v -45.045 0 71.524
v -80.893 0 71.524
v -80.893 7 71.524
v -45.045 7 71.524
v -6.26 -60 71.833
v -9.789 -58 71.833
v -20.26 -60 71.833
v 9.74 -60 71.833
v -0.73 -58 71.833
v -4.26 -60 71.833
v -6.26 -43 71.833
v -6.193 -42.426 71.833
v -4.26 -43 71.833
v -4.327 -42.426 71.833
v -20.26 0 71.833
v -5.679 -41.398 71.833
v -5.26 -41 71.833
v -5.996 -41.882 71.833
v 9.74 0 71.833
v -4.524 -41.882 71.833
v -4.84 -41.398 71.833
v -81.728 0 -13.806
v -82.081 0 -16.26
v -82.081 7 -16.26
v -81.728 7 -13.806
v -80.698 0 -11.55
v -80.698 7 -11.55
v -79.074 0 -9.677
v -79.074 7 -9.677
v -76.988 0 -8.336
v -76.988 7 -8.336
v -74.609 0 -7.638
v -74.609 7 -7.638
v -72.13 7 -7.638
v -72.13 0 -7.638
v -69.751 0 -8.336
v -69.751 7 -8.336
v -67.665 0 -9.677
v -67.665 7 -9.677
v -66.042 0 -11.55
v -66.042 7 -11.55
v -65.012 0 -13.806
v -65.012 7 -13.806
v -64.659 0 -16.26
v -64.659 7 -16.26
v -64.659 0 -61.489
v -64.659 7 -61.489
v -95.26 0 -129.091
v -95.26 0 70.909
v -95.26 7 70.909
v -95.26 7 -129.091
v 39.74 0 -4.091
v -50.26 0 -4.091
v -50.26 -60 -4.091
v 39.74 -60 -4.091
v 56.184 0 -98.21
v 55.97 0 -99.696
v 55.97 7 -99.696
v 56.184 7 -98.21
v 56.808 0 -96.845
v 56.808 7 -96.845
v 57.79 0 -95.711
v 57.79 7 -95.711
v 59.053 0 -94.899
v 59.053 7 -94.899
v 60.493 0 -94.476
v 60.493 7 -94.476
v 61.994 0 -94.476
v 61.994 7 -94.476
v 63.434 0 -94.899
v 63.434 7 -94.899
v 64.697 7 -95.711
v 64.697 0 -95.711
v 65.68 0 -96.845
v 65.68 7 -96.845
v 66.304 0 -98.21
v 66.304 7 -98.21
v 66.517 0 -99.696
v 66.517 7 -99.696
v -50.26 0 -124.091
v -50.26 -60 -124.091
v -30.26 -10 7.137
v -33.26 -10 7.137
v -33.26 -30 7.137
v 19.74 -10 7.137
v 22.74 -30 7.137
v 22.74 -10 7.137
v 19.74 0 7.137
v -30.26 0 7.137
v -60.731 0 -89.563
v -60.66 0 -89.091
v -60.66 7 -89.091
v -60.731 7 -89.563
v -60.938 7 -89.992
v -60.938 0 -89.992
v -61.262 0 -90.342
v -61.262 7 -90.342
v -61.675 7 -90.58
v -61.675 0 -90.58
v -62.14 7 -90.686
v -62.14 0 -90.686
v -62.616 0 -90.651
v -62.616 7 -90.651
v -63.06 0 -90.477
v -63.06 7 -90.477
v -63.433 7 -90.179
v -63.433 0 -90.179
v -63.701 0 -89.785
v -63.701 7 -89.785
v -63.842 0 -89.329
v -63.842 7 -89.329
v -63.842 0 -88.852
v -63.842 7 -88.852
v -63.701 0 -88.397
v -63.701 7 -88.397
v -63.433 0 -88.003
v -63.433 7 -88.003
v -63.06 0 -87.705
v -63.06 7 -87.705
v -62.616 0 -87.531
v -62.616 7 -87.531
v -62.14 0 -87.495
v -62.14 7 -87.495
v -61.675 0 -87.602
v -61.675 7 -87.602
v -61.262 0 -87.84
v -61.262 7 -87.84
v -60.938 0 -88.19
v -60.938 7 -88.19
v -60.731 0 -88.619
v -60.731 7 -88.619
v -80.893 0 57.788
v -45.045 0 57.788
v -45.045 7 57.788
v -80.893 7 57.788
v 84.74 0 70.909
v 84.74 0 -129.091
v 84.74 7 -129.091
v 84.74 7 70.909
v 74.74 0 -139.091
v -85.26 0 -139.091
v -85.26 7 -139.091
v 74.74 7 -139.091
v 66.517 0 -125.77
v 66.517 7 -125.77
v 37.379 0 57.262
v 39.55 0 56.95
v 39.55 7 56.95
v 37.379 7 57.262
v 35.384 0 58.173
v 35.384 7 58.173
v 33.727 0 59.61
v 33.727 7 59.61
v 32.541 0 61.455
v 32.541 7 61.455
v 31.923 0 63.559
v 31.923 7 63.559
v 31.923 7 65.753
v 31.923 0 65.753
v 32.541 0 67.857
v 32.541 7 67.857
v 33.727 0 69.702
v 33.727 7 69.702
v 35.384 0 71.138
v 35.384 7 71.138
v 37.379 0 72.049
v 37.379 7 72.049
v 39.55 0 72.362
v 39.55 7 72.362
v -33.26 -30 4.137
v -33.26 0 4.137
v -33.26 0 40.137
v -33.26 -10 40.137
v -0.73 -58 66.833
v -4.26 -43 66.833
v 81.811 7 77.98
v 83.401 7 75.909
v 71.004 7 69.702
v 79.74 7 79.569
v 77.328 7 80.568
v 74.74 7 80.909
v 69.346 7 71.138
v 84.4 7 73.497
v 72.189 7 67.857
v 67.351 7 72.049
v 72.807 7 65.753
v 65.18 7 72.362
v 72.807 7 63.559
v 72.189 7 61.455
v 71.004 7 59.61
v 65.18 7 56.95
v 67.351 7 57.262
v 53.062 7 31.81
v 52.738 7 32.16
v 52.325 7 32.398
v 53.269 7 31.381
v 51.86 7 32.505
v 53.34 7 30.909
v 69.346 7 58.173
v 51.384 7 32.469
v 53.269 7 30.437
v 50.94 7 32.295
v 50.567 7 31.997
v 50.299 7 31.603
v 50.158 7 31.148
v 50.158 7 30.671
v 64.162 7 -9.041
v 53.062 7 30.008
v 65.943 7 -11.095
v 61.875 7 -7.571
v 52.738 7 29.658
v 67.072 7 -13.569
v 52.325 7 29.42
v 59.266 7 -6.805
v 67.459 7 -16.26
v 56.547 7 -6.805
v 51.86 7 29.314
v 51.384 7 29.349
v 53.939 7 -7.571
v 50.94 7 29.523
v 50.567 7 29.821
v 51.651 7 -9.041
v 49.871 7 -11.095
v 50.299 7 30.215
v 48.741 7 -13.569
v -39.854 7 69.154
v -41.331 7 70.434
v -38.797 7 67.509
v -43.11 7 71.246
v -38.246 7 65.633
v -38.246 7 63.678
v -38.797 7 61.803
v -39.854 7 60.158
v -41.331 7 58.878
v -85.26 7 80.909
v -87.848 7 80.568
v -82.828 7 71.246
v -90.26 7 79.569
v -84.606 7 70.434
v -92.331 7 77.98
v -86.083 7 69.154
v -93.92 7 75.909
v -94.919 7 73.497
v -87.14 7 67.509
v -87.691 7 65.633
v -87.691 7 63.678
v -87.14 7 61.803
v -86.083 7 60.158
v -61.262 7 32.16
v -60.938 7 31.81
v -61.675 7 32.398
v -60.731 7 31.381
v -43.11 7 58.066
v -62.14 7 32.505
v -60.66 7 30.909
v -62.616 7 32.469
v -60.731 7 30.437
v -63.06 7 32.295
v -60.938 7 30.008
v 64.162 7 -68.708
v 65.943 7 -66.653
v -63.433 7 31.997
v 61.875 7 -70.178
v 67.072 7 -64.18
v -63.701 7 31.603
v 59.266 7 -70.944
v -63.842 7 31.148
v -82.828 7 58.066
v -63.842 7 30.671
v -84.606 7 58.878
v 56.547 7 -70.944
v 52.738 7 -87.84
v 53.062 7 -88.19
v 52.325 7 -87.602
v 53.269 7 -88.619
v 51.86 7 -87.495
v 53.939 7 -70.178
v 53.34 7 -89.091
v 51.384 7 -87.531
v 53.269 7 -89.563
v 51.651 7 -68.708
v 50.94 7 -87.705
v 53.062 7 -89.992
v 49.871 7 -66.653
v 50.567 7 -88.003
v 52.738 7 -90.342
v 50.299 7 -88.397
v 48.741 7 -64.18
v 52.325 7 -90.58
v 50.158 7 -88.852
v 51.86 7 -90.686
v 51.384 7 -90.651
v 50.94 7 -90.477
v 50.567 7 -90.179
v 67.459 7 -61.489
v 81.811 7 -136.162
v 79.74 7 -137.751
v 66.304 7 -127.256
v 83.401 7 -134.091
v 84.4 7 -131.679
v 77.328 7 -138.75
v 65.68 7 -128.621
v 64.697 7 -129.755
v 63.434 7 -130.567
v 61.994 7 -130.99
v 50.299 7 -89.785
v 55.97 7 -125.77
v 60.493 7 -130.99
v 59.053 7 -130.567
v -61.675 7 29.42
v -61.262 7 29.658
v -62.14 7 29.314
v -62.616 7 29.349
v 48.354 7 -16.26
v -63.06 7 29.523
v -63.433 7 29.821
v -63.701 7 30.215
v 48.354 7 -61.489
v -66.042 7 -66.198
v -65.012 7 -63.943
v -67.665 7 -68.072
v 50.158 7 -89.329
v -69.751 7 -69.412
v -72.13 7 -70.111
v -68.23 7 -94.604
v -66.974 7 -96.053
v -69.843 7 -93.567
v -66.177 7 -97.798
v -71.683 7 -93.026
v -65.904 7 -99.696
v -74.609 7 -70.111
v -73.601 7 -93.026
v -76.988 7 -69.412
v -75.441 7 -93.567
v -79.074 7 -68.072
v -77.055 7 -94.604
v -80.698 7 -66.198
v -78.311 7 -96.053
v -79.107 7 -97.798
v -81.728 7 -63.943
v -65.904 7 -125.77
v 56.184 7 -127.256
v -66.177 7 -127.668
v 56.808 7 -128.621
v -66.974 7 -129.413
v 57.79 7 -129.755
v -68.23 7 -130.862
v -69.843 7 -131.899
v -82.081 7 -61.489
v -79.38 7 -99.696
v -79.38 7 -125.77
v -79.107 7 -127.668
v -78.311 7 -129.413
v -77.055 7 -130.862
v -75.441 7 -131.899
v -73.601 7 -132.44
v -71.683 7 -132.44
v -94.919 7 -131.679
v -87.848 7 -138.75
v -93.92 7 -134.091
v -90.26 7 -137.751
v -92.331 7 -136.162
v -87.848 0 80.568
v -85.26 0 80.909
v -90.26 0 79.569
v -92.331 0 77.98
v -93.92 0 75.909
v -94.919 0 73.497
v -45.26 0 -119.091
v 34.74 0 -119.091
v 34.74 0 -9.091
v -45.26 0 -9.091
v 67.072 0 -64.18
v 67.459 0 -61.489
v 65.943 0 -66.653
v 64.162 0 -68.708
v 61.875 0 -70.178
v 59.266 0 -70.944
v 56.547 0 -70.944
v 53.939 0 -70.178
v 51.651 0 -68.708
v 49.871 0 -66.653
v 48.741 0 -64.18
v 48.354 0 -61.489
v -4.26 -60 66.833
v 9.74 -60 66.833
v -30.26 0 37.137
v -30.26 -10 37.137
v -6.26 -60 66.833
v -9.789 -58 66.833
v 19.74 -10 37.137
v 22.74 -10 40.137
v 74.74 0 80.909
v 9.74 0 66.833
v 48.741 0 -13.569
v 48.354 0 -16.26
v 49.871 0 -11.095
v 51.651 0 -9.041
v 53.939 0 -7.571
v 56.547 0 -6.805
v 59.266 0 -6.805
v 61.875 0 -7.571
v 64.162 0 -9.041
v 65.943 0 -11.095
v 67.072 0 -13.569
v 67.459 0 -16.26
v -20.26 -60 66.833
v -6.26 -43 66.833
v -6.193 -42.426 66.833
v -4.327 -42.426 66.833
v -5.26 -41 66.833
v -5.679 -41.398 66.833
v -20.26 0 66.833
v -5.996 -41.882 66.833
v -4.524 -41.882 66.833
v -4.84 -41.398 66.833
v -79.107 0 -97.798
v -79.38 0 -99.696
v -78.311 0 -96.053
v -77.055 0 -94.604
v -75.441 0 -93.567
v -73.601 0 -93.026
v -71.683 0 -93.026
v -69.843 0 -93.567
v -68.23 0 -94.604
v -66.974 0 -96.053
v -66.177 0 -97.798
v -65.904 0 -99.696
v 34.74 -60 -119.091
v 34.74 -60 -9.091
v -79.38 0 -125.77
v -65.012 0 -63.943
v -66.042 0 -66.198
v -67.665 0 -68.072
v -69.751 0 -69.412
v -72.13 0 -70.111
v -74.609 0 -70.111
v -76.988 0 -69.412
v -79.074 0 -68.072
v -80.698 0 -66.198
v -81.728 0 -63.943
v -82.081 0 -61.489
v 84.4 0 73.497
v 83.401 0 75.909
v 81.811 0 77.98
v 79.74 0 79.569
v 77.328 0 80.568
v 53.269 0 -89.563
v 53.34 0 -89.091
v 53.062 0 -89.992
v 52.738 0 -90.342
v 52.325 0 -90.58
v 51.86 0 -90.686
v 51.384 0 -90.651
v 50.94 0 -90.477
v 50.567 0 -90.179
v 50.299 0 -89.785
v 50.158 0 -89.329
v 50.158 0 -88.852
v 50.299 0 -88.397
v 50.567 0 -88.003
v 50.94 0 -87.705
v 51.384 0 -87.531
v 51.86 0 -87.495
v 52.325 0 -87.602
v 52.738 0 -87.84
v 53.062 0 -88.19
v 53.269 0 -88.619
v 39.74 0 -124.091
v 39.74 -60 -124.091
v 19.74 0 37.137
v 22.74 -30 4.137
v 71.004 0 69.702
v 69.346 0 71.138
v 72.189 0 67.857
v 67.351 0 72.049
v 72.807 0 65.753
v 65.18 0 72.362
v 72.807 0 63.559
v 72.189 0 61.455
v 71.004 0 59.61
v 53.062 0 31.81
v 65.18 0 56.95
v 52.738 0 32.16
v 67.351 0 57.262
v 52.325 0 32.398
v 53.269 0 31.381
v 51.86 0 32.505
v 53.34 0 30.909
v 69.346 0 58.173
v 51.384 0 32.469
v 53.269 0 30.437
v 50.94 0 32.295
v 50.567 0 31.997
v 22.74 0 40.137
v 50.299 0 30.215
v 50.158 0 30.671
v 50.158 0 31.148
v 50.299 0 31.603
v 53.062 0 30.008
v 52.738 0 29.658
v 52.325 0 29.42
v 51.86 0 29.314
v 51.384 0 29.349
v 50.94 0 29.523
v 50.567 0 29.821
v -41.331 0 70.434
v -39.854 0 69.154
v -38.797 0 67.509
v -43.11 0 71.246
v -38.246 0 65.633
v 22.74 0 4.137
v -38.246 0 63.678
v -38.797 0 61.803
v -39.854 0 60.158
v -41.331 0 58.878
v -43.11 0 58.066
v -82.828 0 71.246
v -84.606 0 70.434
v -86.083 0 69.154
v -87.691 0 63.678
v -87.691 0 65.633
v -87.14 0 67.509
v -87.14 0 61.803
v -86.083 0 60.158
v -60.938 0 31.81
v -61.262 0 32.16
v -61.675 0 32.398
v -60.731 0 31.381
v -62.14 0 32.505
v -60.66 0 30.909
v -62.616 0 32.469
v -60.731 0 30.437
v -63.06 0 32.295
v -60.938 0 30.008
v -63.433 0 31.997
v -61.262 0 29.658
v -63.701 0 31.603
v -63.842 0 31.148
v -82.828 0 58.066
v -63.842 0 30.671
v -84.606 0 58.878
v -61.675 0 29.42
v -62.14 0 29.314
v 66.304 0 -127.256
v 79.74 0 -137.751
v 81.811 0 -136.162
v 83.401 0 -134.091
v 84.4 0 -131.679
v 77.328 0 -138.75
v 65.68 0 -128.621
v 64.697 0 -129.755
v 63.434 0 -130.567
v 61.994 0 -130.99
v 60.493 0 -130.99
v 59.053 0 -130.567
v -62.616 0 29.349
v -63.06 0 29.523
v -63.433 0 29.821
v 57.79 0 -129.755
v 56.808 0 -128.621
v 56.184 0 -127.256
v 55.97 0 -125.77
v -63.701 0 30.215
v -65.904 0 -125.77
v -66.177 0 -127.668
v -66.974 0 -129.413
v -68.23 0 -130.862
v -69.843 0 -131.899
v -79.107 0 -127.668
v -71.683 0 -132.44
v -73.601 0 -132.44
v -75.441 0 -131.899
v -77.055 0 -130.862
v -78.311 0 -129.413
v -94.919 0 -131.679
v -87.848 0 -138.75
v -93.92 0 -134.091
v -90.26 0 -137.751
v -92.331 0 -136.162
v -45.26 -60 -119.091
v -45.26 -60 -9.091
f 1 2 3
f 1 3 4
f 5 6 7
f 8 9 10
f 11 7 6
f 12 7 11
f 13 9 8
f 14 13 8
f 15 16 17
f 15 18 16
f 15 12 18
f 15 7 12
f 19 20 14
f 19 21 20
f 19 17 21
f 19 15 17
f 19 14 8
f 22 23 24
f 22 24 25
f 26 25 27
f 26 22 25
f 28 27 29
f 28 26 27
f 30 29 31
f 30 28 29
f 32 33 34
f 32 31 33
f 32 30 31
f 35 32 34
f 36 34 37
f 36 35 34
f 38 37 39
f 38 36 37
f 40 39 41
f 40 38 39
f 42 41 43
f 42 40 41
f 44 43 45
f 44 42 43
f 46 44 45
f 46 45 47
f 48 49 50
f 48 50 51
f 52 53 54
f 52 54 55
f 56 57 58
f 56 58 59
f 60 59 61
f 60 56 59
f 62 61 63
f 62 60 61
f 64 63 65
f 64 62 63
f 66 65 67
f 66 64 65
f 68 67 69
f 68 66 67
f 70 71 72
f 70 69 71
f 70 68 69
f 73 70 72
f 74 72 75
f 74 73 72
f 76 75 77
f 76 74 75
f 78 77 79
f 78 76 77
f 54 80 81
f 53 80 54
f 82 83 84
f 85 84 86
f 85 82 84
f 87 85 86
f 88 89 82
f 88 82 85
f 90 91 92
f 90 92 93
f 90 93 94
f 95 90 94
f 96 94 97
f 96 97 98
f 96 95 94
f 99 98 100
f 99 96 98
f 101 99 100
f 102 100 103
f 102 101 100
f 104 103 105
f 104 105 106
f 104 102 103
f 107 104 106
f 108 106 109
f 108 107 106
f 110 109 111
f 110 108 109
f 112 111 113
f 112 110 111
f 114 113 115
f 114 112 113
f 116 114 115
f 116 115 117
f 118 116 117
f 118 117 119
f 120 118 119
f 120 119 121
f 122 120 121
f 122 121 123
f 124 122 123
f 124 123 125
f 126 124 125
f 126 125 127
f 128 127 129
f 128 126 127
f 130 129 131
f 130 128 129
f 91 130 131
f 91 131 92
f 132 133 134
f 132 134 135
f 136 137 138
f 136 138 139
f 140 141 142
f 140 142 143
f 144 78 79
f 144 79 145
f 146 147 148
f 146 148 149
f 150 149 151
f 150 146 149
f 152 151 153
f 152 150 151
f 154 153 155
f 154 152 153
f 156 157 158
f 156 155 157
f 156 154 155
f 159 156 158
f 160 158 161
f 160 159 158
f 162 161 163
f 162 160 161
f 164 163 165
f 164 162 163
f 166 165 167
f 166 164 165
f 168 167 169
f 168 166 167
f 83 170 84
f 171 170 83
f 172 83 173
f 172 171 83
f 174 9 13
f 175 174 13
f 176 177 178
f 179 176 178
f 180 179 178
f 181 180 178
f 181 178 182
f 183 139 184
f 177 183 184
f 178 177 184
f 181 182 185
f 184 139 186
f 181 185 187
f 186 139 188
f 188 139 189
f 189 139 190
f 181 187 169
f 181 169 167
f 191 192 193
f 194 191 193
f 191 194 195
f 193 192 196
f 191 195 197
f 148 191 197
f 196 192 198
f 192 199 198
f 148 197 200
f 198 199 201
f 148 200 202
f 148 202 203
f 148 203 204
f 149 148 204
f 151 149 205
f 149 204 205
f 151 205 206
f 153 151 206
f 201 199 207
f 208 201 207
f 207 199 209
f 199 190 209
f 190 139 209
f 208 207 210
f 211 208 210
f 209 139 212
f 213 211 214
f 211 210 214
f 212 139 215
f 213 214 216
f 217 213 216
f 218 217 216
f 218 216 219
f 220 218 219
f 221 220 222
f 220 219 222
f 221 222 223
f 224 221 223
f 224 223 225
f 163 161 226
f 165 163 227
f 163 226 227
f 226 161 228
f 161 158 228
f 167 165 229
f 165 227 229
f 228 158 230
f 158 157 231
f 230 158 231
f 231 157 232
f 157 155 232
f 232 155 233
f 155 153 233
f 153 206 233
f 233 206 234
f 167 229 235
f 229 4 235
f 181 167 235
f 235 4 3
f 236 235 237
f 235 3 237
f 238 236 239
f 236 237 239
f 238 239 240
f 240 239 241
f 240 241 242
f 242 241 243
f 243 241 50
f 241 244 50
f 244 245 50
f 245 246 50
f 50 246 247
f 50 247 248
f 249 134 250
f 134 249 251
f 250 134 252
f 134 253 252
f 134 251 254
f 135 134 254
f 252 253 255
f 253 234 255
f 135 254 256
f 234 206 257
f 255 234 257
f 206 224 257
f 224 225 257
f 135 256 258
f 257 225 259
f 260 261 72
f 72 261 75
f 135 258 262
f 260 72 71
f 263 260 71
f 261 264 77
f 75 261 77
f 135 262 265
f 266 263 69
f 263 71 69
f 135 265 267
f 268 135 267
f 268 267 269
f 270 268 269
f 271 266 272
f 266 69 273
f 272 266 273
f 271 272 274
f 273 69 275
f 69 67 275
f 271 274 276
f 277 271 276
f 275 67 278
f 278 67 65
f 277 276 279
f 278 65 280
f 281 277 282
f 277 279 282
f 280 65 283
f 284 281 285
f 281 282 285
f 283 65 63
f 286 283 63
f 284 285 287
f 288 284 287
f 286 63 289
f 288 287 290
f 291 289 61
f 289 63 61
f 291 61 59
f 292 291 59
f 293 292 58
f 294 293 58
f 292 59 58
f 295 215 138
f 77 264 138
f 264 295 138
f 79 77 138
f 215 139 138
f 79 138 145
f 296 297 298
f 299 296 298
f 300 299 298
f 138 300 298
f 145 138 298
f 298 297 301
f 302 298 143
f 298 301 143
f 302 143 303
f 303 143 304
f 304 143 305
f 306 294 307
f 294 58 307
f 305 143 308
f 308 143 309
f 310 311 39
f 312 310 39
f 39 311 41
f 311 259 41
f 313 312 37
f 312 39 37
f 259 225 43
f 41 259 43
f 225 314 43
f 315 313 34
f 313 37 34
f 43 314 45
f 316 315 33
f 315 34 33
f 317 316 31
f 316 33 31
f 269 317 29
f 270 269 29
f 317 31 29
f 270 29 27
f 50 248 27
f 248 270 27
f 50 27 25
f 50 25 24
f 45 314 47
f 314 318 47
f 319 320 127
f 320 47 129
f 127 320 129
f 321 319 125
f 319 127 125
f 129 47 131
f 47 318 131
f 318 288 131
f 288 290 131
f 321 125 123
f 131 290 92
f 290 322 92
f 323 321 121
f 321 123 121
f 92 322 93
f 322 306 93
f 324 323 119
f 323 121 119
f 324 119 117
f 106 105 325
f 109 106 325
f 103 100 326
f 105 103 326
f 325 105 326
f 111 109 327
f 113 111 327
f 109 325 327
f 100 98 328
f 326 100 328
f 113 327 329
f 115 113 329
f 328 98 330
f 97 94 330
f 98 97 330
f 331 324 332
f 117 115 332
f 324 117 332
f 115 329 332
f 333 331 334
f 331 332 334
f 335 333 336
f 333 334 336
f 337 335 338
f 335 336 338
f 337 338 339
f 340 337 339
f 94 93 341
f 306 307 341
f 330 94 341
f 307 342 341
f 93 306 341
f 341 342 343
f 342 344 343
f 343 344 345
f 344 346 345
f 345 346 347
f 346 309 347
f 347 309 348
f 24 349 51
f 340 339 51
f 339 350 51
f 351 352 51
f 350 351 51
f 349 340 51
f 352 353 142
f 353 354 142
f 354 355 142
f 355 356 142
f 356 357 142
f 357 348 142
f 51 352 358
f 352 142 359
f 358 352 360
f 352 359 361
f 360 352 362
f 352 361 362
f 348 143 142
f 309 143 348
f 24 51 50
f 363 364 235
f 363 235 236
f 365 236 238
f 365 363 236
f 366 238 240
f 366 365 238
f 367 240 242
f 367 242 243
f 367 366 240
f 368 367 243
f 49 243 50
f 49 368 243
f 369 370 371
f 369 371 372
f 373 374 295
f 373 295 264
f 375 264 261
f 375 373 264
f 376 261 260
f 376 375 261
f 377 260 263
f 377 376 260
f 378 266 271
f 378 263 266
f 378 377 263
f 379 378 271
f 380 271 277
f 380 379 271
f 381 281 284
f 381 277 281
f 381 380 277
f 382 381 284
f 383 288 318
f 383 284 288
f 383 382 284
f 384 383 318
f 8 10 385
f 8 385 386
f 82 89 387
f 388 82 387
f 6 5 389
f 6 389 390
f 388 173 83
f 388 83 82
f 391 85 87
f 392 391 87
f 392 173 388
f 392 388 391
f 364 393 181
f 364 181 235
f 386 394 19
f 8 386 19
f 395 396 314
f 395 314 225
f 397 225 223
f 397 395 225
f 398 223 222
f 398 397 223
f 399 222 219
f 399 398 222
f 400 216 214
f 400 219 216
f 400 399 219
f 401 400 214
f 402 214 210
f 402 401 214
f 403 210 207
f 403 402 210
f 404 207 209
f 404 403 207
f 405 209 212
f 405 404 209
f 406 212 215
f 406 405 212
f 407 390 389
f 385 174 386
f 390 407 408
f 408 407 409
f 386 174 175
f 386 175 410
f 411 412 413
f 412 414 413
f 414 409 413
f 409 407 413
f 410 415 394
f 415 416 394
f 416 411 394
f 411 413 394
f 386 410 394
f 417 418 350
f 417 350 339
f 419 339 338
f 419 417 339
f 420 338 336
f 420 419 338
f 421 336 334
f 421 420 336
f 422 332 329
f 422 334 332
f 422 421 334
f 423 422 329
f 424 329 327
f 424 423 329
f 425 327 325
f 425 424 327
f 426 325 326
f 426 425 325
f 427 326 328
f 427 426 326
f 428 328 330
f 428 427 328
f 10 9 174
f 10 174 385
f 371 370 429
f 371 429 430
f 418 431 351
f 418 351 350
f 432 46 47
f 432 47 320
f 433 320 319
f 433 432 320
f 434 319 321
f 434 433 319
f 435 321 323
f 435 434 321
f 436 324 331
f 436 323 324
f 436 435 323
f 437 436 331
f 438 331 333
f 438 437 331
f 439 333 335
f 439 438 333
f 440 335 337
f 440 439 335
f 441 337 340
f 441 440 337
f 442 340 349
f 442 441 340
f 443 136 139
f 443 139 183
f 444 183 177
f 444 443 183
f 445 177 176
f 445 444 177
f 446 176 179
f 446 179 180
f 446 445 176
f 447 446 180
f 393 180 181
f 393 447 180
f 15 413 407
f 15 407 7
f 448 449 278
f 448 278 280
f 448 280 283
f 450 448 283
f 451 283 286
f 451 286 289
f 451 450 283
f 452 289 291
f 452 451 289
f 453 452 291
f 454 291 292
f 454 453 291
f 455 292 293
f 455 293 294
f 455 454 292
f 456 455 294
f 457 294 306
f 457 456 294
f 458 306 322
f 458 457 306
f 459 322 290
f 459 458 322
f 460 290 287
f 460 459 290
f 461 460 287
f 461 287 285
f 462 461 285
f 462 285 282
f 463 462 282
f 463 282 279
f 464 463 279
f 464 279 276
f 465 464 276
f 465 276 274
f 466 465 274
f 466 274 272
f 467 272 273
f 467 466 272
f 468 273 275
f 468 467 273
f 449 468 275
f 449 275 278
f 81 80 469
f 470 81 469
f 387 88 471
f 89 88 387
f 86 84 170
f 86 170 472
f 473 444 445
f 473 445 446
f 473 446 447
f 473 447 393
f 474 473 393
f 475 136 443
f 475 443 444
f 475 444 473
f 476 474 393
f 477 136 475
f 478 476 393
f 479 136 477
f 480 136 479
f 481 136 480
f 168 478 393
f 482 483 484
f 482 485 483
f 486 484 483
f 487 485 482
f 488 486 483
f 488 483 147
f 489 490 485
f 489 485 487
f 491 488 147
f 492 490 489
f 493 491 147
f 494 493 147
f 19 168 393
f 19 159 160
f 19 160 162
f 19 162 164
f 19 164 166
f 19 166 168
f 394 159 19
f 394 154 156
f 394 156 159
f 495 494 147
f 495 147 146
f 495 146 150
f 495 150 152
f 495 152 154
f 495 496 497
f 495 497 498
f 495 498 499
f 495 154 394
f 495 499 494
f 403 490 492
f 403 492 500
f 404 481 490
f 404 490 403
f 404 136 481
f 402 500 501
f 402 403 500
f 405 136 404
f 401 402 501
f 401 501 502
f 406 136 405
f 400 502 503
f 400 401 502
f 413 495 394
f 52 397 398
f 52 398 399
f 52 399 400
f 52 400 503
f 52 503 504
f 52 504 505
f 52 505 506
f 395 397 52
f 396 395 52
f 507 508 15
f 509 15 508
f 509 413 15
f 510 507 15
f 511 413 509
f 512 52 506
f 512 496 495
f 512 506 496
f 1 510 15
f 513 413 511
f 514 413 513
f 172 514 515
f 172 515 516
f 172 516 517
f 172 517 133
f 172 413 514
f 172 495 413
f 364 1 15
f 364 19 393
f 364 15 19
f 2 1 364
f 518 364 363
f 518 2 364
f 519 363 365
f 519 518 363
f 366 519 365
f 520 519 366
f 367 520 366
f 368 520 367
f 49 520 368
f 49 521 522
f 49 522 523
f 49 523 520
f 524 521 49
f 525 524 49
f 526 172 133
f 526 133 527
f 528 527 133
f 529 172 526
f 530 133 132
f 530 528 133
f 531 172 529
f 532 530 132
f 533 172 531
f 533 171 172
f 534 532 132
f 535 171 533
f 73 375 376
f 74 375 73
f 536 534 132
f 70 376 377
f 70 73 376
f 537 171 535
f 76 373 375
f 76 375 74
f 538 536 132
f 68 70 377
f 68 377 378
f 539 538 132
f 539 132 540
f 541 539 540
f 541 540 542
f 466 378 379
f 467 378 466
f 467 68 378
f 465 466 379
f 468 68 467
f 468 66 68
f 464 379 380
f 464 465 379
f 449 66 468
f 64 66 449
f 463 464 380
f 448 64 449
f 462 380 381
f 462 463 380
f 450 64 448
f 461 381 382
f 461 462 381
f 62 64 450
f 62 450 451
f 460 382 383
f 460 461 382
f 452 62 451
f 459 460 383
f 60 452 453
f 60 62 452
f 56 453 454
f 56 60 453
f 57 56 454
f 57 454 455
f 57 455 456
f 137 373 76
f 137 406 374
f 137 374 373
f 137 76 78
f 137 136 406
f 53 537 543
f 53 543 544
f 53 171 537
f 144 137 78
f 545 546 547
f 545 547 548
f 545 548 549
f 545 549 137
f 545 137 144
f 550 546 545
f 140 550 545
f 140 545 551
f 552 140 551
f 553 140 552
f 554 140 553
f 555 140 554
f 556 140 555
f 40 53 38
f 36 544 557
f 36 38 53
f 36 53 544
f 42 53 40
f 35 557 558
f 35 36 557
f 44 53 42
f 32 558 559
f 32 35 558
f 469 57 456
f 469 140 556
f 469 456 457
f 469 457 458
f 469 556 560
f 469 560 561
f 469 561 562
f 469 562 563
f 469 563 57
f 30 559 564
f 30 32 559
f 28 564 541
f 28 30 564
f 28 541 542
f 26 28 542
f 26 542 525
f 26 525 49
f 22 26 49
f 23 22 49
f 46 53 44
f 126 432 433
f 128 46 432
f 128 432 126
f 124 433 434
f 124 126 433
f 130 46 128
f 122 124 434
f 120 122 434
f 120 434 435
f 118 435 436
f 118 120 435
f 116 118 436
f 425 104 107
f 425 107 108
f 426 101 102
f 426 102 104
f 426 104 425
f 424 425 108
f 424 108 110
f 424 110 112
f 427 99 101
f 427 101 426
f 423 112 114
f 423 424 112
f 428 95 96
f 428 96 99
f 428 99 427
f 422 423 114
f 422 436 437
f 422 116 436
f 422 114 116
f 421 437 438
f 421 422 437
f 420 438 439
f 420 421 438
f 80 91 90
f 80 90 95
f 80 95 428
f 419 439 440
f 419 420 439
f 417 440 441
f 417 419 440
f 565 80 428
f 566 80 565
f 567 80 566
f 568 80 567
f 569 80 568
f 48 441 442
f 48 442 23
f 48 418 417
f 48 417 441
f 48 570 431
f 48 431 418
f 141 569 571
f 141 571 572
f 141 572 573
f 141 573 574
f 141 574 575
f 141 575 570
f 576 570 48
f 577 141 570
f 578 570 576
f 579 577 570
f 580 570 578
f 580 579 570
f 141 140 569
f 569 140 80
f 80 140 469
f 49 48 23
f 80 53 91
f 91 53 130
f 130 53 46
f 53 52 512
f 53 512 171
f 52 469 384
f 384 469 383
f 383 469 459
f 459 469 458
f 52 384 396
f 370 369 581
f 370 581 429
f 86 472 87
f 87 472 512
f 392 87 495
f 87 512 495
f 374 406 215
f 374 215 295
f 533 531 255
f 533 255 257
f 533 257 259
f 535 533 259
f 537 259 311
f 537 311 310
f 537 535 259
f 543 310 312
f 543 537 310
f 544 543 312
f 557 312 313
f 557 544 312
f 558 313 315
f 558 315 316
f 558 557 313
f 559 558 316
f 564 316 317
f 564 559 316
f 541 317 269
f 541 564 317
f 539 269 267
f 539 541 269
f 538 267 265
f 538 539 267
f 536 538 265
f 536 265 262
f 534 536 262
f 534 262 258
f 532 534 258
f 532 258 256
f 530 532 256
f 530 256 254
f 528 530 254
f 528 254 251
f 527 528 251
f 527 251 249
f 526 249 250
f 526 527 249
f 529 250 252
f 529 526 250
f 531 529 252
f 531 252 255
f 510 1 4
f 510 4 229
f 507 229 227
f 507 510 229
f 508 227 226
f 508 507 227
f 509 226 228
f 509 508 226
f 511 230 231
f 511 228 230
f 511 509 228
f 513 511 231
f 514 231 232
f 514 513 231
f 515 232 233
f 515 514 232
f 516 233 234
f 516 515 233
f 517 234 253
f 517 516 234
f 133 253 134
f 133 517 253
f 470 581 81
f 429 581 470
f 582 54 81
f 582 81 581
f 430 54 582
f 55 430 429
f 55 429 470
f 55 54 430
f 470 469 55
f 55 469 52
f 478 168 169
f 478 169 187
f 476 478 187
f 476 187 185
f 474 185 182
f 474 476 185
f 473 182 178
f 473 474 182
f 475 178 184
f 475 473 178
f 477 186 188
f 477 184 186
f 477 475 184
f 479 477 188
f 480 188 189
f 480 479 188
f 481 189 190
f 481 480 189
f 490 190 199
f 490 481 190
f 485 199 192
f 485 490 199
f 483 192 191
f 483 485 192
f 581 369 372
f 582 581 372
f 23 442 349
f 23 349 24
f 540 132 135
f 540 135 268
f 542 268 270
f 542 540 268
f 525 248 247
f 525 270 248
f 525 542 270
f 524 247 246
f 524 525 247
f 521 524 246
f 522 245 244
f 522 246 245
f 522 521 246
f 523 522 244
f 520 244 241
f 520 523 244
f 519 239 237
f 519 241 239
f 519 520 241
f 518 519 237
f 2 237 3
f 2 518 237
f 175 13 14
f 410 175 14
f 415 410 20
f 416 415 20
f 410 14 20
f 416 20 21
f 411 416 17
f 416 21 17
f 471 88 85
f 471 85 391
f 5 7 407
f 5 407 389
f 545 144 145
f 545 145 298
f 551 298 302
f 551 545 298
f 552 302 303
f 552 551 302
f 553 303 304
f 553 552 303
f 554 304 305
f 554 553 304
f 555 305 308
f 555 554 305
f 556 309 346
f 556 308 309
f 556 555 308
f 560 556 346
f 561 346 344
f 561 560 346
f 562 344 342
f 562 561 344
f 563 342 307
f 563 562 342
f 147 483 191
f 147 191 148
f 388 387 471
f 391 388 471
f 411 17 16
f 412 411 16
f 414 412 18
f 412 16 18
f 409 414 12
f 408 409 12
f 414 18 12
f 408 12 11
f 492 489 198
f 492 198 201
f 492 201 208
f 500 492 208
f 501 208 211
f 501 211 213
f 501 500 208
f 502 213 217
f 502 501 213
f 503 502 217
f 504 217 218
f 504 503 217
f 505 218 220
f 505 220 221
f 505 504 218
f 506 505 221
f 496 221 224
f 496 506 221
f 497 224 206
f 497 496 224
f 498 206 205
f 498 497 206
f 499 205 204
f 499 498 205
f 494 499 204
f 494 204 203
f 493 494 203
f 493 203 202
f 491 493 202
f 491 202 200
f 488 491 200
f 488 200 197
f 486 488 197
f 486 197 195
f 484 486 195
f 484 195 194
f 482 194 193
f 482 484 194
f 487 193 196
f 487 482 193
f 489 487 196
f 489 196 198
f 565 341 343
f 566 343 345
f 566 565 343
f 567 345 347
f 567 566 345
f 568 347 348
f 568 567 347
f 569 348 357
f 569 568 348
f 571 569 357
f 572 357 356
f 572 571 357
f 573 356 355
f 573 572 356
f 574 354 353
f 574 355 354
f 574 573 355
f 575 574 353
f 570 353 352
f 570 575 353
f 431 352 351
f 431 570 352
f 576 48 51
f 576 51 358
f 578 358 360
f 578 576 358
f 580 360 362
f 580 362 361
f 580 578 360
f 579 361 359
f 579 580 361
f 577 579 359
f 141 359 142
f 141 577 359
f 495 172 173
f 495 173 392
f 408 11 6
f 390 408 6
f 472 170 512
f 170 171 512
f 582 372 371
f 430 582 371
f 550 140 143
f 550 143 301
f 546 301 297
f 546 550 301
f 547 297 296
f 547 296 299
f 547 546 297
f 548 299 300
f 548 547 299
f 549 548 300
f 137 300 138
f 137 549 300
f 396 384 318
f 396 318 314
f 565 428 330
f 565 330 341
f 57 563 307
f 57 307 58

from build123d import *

# Parameters (mm, degrees)
SKETCH_1_R          = 1.6
EXTRUDE_1_DEPTH     = 7
SKETCH_2_W          = 90
SKETCH_2_H          = 120
SKETCH_2_W_2        = 80
SKETCH_2_H_2        = 110
EXTRUDE_2_DEPTH     = 60
SKETCH_3_W          = 56
SKETCH_3_H          = 36
SKETCH_3_W_2        = 50
SKETCH_3_H_2        = 30
EXTRUDE_3_DEPTH     = 10
SKETCH_5_W          = 56
SKETCH_5_H          = 3
EXTRUDE_4_DEPTH     = 20
SKETCH_6_W          = 30
SKETCH_6_H          = 5
EXTRUDE_5_DEPTH     = 60
CUT_EXTRUDE_1_DEPTH = 10
EXTRUDE_6_DEPTH     = 5
CUT_EXTRUDE_2_DEPTH = 10
CUT_EXTRUDE_3_DEPTH = 10
CUT_EXTRUDE_4_DEPTH = 10


with BuildPart() as part:
    # 草图1 → 凸台-拉伸1 (new body)
    with BuildSketch(Plane(origin=(0, 0, 0), x_dir=(1, 0, 0), z_dir=(0, 1, 0))):
        with BuildLine():
            Line((-85.25974026, 139.090909091), (74.74025974, 139.090909091))
            ThreePointArc((74.74025974, 139.090909091), (81.811327552, 136.161976903), (84.74025974, 129.090909091))
            Line((84.74025974, 129.090909091), (84.74025974, -70.909090909))
            ThreePointArc((84.74025974, -70.909090909), (81.811327552, -77.980158721), (74.74025974, -80.909090909))
            Line((74.74025974, -80.909090909), (-85.25974026, -80.909090909))
            ThreePointArc((-85.25974026, -80.909090909), (-92.330808072, -77.980158721), (-95.25974026, -70.909090909))
            Line((-95.25974026, -70.909090909), (-95.25974026, 129.090909091))
            ThreePointArc((-95.25974026, 129.090909091), (-92.330808072, 136.161976903), (-85.25974026, 139.090909091))
        make_face()
        with Locations((-62.25974026, 89.090909091)):
            Circle(SKETCH_1_R, mode=Mode.SUBTRACT)
        with Locations((51.74025974, 89.090909091)):
            Circle(SKETCH_1_R, mode=Mode.SUBTRACT)
        with Locations((-62.25974026, -30.909090909)):
            Circle(SKETCH_1_R, mode=Mode.SUBTRACT)
        with Locations((51.74025974, -30.909090909)):
            Circle(SKETCH_1_R, mode=Mode.SUBTRACT)
    extrude(amount=EXTRUDE_1_DEPTH)

    # 草图2 → 凸台-拉伸2 (add)
    with BuildSketch(Plane.XZ):
        with Locations((-5.25974026, -64.090909091)):
            Rectangle(SKETCH_2_W, SKETCH_2_H)
        with Locations((-5.25974026, -64.090909091)):
            Rectangle(SKETCH_2_W_2, SKETCH_2_H_2, mode=Mode.SUBTRACT)
    extrude(amount=EXTRUDE_2_DEPTH)

    # 草图3 → 凸台-拉伸3 (add)
    with BuildSketch(Plane.XZ):
        with Locations((-5.25974026, 22.137368895)):
            Rectangle(SKETCH_3_W, SKETCH_3_H)
        with Locations((-5.25974026, 22.137368895)):
            Rectangle(SKETCH_3_W_2, SKETCH_3_H_2, mode=Mode.SUBTRACT)
    extrude(amount=EXTRUDE_3_DEPTH)

    # 草图5 → 凸台-拉伸4 (add)
    with BuildSketch(Plane.XZ.offset(10)):
        with Locations((-5.25974026, 5.637368895)):
            Rectangle(SKETCH_5_W, SKETCH_5_H)
    extrude(amount=EXTRUDE_4_DEPTH)

    # 草图6 → 凸台-拉伸5 (add)
    with BuildSketch(Plane.XZ):
        with Locations((-5.25974026, 69.33277689)):
            Rectangle(SKETCH_6_W, SKETCH_6_H)
    extrude(amount=EXTRUDE_5_DEPTH)

    # 草图8 → 切除-拉伸1 (cut)
    with BuildSketch(Plane.XY.offset(71.83277689)):
        with BuildLine():
            Line((-6.25974026, -43), (-10.25974026, -60))
            Line((-10.25974026, -60), (-0.25974026, -60))
            Line((-0.25974026, -60), (-4.25974026, -43))
            ThreePointArc((-4.25974026, -43), (-4.523672282, -41.881966011), (-5.25974026, -41))
            ThreePointArc((-5.25974026, -41), (-5.995808237, -41.881966011), (-6.25974026, -43))
        make_face()
    extrude(amount=-CUT_EXTRUDE_1_DEPTH, mode=Mode.SUBTRACT)

    # 草图9 → 凸台-拉伸6 (add)
    with BuildSketch(Plane.XY.offset(71.83277689)):
        Polygon((-6.25974026, -60), (-9.789152024, -58), (-10.25974026, -60), align=None)
        Polygon((-4.25974026, -60), (-0.25974026, -60), (-0.730328495, -58), align=None)
    extrude(amount=-EXTRUDE_6_DEPTH)

    # 草图10 → 切除-拉伸2 (cut)
    with BuildSketch(Plane.XZ):
        with BuildLine():
            Line((-64.659020205, -16.259764427), (-64.659020205, -61.488758584))
            ThreePointArc((-64.659020205, -61.488758584), (-73.36978945, -70.199527829), (-82.080558695, -61.488758584))
            Line((-82.080558695, -61.488758584), (-82.080558695, -16.259764427))
            ThreePointArc((-82.080558695, -16.259764427), (-73.36978945, -7.548995182), (-64.659020205, -16.259764427))
        make_face()
        with BuildLine():
            Line((67.459227113, -16.259764427), (67.459227113, -61.488758584))
            ThreePointArc((67.459227113, -61.488758584), (57.906863547, -71.04112215), (48.354499981, -61.488758584))
            Line((48.354499981, -61.488758584), (48.354499981, -16.259764427))
            ThreePointArc((48.354499981, -16.259764427), (57.906863547, -6.707400861), (67.459227113, -16.259764427))
        make_face()
    extrude(amount=-CUT_EXTRUDE_2_DEPTH, mode=Mode.SUBTRACT)

    # 草图11 → 切除-拉伸3 (cut)
    with BuildSketch(Plane.XZ):
        with BuildLine():
            Line((-80.892767317, 71.523985845), (-45.044601578, 71.523985845))
            ThreePointArc((-45.044601578, 71.523985845), (-38.176495058, 64.655879325), (-45.044601578, 57.787772805))
            Line((-45.044601578, 57.787772805), (-80.892767317, 57.787772805))
            ThreePointArc((-80.892767317, 57.787772805), (-87.760873837, 64.655879325), (-80.892767317, 71.523985845))
        make_face()
        with BuildLine():
            Line((39.550368976, 72.361559811), (65.180132332, 72.361559811))
            ThreePointArc((65.180132332, 72.361559811), (72.885812818, 64.655879325), (65.180132332, 56.950198839))
            Line((65.180132332, 56.950198839), (39.550368976, 56.950198839))
            ThreePointArc((39.550368976, 56.950198839), (31.84468849, 64.655879325), (39.550368976, 72.361559811))
        make_face()
    extrude(amount=-CUT_EXTRUDE_3_DEPTH, mode=Mode.SUBTRACT)

    # 草图12 → 切除-拉伸4 (cut)
    with BuildSketch(Plane.XZ):
        with BuildLine():
            Line((-65.903935016, -99.695986078), (-65.903935016, -125.770060152))
            ThreePointArc((-65.903935016, -125.770060152), (-72.642178878, -132.508304014), (-79.38042274, -125.770060152))
            Line((-79.38042274, -125.770060152), (-79.38042274, -99.695986078))
            ThreePointArc((-79.38042274, -99.695986078), (-72.642178878, -92.957742216), (-65.903935016, -99.695986078))
        make_face()
        with BuildLine():
            Line((66.517205225, -99.695986078), (66.517205225, -125.770060152))
            ThreePointArc((66.517205225, -125.770060152), (61.243796985, -131.043468392), (55.970388746, -125.770060152))
            Line((55.970388746, -125.770060152), (55.970388746, -99.695986078))
            ThreePointArc((55.970388746, -99.695986078), (61.243796985, -94.422577838), (66.517205225, -99.695986078))
        make_face()
    extrude(amount=-CUT_EXTRUDE_4_DEPTH, mode=Mode.SUBTRACT)


solid = part.part
